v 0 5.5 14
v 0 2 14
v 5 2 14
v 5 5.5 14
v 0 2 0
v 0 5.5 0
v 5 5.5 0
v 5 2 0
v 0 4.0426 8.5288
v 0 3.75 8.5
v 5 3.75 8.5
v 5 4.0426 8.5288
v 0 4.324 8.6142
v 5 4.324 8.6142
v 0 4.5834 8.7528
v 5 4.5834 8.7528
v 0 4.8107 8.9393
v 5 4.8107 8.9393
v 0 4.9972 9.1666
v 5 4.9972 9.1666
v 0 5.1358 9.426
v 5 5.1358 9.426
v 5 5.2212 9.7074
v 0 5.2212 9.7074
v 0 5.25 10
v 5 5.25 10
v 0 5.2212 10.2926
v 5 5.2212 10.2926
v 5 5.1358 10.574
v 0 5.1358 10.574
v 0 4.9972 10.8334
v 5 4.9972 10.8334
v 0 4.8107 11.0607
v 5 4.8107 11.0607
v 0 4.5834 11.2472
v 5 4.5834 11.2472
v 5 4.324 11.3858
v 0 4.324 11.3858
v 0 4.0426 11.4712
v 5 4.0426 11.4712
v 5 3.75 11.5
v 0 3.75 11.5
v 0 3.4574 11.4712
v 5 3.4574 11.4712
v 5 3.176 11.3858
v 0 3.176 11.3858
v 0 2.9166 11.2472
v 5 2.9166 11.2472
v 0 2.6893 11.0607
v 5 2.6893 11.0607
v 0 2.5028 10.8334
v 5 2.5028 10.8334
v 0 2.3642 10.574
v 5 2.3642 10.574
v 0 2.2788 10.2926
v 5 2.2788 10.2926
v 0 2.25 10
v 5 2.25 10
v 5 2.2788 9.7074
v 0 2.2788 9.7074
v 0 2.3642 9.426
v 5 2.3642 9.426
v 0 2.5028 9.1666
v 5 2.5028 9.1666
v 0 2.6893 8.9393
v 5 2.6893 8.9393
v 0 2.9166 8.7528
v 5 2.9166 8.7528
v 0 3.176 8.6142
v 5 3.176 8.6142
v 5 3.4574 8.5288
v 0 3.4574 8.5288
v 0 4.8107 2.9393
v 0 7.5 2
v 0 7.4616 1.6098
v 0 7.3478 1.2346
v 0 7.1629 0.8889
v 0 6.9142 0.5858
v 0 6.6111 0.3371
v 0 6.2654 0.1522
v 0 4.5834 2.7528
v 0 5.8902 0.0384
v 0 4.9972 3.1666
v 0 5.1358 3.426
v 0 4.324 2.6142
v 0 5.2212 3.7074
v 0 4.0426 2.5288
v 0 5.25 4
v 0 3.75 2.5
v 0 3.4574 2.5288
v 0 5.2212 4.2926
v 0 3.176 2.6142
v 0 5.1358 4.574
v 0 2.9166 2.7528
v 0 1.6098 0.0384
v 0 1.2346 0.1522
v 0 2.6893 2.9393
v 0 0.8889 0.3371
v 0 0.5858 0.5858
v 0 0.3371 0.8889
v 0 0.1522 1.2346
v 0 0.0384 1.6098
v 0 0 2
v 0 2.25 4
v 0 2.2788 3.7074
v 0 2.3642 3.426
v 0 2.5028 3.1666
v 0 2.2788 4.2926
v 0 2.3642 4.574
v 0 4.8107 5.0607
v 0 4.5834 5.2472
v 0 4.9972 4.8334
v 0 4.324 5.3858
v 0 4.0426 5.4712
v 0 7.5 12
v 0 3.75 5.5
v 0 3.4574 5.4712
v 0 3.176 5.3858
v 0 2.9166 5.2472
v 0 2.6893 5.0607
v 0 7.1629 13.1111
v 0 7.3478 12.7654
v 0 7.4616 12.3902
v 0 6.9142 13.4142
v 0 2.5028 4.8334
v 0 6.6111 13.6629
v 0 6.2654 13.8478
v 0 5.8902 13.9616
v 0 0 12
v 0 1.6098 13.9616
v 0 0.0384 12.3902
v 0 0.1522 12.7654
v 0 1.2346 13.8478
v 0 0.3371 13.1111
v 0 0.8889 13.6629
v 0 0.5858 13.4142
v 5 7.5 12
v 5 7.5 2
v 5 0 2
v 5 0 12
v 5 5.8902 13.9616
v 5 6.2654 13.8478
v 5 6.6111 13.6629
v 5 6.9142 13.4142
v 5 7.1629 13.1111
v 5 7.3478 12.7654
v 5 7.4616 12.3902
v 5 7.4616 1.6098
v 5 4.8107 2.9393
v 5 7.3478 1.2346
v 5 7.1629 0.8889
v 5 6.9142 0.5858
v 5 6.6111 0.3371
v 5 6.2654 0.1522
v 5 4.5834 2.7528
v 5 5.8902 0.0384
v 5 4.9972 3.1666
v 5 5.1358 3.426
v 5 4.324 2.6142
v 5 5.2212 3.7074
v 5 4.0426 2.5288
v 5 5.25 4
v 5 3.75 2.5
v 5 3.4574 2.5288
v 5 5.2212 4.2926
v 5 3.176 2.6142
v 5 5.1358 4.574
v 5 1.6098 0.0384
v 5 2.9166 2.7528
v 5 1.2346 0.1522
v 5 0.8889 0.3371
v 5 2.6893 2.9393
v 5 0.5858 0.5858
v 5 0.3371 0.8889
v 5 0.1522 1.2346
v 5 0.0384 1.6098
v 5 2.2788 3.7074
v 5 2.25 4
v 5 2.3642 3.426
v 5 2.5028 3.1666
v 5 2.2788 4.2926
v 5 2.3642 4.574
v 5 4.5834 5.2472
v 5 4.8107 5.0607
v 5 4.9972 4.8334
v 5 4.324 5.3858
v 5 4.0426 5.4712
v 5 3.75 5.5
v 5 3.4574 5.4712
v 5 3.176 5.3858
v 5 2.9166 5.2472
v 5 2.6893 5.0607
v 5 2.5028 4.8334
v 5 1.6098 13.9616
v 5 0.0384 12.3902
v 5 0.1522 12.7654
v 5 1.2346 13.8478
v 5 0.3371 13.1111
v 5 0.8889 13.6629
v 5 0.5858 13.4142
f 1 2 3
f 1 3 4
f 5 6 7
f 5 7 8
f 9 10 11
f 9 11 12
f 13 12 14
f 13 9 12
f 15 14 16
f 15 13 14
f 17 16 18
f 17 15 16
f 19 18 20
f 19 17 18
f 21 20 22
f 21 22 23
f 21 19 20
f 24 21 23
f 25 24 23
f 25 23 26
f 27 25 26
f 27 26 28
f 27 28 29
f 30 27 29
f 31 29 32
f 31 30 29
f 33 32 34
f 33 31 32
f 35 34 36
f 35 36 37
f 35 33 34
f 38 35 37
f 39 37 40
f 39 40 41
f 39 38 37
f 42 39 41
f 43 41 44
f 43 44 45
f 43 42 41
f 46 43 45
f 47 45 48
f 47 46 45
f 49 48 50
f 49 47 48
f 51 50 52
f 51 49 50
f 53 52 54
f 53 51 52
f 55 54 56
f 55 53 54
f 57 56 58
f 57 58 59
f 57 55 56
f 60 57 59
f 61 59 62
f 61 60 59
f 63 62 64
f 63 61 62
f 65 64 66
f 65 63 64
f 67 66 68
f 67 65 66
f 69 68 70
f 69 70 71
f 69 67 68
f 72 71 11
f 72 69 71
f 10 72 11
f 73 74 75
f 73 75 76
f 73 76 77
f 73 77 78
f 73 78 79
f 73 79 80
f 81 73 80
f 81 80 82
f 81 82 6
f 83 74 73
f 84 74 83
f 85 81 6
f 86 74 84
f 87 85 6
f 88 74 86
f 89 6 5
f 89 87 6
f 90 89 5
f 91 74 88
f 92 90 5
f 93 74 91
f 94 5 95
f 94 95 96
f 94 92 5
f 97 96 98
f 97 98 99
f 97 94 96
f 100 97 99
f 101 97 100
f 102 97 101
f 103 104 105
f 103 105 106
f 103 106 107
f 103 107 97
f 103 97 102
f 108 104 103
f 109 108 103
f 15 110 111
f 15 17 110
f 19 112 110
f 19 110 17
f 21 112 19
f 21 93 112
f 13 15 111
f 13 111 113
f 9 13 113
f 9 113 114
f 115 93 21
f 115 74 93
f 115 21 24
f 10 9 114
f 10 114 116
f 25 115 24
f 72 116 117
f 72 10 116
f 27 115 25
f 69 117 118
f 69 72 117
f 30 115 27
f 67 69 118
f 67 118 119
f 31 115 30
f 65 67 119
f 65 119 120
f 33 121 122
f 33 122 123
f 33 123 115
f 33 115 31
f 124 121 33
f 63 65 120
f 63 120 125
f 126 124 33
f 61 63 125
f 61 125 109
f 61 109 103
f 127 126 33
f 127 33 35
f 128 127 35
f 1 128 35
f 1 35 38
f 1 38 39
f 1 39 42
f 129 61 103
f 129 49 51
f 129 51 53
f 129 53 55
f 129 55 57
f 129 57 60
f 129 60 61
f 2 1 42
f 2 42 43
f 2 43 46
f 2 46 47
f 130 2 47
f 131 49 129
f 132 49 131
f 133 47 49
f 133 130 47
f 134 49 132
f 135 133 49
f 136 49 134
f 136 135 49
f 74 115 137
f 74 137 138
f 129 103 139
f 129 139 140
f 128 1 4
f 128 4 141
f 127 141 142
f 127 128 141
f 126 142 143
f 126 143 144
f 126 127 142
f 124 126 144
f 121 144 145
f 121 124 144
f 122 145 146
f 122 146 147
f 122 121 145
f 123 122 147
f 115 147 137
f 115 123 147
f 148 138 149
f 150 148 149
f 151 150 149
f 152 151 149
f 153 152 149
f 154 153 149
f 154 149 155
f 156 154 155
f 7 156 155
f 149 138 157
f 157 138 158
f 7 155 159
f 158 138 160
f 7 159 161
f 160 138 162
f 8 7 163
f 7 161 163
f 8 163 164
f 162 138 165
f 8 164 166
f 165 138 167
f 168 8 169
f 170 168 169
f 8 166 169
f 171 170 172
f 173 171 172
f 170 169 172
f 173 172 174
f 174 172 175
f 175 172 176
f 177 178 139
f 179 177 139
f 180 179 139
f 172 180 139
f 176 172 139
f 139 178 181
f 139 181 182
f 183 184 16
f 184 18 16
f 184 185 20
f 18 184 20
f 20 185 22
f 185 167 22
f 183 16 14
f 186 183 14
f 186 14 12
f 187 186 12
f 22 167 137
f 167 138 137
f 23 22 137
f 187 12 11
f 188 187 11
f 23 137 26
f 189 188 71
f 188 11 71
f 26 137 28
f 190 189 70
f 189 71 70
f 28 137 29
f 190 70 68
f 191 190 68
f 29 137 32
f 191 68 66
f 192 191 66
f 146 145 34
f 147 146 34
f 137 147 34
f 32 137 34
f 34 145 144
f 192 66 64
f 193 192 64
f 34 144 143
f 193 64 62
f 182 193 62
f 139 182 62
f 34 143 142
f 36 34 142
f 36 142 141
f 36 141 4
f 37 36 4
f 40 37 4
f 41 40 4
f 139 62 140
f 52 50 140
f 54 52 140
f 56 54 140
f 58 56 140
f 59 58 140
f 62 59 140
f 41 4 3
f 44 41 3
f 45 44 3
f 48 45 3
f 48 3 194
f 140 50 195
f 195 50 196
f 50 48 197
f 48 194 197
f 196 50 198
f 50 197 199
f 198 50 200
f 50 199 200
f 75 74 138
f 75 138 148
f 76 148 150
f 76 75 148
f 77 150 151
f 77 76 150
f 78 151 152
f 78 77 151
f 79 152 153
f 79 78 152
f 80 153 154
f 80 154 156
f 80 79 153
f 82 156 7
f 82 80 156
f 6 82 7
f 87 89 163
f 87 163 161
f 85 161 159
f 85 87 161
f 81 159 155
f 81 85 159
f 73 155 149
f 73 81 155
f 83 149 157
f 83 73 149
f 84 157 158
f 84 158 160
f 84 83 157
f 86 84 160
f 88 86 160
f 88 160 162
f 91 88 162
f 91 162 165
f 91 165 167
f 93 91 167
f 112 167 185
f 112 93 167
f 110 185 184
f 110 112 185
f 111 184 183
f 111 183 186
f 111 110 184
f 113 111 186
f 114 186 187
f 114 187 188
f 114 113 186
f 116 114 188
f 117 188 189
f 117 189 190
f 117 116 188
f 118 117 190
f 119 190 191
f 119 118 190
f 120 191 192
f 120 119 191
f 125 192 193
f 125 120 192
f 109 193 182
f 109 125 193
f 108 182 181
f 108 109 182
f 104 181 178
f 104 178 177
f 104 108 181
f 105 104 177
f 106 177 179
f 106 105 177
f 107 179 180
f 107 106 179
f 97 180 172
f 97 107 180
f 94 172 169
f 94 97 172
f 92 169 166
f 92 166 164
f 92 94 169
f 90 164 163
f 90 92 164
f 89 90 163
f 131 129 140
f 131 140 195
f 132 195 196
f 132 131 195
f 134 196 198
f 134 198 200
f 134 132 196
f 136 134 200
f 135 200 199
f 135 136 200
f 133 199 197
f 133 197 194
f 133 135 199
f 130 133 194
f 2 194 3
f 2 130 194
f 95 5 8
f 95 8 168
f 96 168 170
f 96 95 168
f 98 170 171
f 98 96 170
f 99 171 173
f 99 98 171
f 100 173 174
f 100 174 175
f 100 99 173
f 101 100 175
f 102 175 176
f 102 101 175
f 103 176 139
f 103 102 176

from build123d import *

# Parameters (mm, degrees)
SKETCH1_R           = 1.5
BOSS_EXTRUDE1_DEPTH = 5


with BuildPart() as part:
    # Sketch1 → Boss-Extrude1 (new body)
    with BuildSketch(Plane.YZ):
        with BuildLine():
            Line((0, 2), (0, 12))
            ThreePointArc((0, 12), (0.585786438, 13.414213562), (2, 14))
            Line((2, 14), (5.5, 14))
            ThreePointArc((5.5, 14), (6.914213562, 13.414213562), (7.5, 12))
            Line((7.5, 12), (7.5, 2))
            ThreePointArc((7.5, 2), (6.914213562, 0.585786438), (5.5, 0))
            Line((5.5, 0), (2, 0))
            ThreePointArc((2, 0), (0.585786438, 0.585786438), (0, 2))
        make_face()
        with Locations(Location((3.75, 10, 0), (0, 0, 270))):
            Circle(SKETCH1_R, mode=Mode.SUBTRACT)
        with Locations(Location((3.75, 4, 0), (0, 0, 270))):
            Circle(SKETCH1_R, mode=Mode.SUBTRACT)
    extrude(amount=BOSS_EXTRUDE1_DEPTH)


solid = part.part
